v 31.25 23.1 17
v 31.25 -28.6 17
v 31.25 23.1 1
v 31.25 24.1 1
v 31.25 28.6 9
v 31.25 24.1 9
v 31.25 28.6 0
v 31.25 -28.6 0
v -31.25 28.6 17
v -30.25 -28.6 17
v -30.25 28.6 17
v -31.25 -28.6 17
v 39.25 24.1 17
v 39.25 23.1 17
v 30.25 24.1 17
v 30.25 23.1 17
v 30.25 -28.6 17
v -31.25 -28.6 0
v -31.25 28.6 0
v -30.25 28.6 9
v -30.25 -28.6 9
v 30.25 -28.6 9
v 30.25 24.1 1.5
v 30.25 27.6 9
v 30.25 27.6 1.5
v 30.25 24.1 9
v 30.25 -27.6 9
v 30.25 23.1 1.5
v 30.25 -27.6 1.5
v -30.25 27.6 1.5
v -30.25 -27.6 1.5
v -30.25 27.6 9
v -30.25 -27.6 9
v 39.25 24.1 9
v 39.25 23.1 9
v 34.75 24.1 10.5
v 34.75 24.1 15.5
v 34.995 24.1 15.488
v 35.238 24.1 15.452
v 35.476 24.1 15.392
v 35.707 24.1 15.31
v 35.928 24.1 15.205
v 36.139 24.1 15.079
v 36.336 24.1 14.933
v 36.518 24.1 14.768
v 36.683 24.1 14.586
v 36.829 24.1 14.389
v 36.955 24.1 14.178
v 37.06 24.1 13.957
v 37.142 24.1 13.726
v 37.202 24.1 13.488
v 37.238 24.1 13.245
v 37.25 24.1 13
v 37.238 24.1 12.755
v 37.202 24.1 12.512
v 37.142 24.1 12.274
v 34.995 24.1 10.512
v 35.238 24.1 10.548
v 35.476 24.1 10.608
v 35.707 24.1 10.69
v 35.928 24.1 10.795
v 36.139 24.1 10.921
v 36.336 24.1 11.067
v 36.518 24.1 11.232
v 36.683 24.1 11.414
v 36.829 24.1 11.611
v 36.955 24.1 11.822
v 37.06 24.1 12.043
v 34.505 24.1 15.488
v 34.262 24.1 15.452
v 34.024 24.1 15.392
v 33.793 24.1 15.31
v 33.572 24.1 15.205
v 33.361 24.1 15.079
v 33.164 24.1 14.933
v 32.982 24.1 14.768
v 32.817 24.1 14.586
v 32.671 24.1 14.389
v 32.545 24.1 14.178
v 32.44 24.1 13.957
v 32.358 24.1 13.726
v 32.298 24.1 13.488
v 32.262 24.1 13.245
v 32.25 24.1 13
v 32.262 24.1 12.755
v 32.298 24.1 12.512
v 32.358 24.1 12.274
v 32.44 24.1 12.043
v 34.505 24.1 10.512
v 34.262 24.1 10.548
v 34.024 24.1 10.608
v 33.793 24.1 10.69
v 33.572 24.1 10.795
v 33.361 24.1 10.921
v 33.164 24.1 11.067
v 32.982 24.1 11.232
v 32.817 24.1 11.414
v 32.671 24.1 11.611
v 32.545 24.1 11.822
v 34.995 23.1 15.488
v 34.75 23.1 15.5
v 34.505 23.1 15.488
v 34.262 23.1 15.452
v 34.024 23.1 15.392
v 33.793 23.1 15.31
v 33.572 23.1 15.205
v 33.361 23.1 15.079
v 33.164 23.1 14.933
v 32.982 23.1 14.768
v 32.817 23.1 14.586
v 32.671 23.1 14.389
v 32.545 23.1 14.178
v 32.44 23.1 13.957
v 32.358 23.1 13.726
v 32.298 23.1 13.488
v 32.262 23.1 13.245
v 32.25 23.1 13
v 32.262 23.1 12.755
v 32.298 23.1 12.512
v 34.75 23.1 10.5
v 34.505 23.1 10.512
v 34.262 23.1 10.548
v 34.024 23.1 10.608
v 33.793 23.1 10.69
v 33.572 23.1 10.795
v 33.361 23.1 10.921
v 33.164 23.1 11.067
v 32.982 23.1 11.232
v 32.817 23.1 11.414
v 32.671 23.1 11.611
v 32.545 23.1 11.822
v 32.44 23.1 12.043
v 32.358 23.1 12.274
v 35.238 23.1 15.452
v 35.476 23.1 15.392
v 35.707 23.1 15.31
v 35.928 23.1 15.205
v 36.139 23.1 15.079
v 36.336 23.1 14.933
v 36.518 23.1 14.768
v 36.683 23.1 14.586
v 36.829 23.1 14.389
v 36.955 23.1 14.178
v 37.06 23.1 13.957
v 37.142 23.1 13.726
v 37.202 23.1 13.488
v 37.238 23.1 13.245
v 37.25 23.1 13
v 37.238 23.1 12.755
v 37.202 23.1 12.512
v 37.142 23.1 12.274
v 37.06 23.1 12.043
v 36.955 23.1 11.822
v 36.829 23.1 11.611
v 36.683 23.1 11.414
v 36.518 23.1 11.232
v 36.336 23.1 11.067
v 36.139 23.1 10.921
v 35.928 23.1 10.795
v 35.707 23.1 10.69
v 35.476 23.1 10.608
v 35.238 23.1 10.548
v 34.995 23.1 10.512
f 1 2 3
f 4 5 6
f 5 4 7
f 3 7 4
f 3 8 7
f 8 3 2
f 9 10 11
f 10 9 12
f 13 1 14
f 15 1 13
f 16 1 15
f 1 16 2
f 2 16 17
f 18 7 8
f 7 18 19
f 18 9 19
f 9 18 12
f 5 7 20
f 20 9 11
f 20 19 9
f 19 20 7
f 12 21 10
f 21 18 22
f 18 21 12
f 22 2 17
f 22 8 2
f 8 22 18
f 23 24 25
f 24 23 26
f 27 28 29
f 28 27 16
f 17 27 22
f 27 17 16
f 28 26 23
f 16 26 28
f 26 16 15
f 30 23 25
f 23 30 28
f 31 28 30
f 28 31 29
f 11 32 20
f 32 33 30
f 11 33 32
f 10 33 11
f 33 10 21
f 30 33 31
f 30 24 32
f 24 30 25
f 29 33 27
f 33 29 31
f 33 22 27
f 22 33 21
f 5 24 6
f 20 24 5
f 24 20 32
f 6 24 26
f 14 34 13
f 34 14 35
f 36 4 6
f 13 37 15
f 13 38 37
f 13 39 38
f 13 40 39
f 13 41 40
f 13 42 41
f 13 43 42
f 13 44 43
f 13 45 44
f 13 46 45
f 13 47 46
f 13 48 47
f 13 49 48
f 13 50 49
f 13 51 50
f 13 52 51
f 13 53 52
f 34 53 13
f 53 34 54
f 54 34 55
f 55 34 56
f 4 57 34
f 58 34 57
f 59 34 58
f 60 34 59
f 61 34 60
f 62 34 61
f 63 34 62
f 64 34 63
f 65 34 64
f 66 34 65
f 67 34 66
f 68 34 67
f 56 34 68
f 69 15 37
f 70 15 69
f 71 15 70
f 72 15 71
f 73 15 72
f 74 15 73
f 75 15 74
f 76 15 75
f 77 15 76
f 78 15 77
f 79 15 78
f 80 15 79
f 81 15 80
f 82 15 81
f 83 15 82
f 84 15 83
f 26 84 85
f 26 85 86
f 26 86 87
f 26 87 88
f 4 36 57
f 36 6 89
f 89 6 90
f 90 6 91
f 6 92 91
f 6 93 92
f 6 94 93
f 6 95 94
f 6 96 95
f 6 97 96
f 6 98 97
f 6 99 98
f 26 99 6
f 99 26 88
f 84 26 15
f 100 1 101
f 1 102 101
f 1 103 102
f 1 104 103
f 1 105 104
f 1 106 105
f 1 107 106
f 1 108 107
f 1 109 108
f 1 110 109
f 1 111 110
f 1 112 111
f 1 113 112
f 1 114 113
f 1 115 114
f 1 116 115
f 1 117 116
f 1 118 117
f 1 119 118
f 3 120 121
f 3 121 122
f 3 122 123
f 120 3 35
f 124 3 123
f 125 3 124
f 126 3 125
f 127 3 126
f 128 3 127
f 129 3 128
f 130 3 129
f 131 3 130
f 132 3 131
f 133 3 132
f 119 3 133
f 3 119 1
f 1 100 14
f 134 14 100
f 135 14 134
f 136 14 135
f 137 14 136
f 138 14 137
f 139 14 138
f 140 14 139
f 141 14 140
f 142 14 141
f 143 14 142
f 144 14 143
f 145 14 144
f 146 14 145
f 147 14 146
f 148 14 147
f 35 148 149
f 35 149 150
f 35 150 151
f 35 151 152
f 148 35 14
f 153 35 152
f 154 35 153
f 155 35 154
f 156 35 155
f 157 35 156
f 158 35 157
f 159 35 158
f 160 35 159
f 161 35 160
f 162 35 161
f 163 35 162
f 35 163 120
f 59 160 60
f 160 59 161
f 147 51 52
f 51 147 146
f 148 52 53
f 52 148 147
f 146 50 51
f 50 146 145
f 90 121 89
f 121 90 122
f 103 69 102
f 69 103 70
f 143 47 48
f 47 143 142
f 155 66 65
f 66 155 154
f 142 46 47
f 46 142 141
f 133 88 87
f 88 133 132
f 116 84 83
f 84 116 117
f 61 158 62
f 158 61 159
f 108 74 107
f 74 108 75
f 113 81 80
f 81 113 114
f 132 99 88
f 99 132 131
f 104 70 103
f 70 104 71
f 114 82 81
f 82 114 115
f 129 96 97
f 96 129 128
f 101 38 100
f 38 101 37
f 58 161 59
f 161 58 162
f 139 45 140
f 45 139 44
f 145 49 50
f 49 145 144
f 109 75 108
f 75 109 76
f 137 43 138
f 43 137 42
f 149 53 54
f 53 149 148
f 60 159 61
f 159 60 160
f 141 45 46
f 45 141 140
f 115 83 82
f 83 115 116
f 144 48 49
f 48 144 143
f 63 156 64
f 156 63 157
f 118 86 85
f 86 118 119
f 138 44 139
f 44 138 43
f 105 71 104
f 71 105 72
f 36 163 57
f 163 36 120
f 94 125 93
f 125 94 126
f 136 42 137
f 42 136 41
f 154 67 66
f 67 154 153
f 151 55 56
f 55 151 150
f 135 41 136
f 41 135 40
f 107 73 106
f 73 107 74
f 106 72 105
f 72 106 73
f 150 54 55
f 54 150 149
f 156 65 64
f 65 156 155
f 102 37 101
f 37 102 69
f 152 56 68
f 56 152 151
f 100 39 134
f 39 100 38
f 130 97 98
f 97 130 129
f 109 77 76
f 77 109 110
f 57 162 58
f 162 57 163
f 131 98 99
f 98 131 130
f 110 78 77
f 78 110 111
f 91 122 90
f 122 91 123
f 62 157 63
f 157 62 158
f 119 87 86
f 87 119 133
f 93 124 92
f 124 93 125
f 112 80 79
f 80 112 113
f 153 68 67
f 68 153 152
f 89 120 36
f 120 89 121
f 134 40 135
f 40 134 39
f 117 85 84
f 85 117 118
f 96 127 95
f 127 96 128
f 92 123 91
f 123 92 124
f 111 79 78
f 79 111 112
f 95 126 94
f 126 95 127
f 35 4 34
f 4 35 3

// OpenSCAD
$fn=64;

thickness=1;
//ductLength=50;
//ductLength=9;
ctrlWidth=60.5;
fanHeight=55.2;
ctrlNotch=8;
bottomNotch=4.5;
sideNotch=9;
screwHoleD=5;


//right angled triangle
//l - length of prism
//w - width of triangle
//h - height of triangle
//From https://github.com/orionrobots/openscad_parts_library/blob/master/prism.scad
module prism(l, w, h) {
       polyhedron(points=[
               [0,0,h],           // 0    front top corner
               [0,0,0],[w,0,0],   // 1, 2 front left & right bottom corners
               [0,l,h],           // 3    back top corner
               [0,l,0],[w,l,0]    // 4, 5 back left & right bottom corners
       ], faces=[ // points for all faces must be ordered clockwise when looking in
               [0,2,1],    // top face
               [3,4,5],    // base face
               [0,1,4,3],  // h face
               [1,2,5,4],  // w face
               [0,3,5,2],  // hypotenuse face
       ]);
}

module screwFlap()
{
    //Upper inside corner is origo
    
    difference()
    {
        translate([sideNotch/2,-0.75*thickness,-ctrlNotch/2])cube([sideNotch,thickness,ctrlNotch],center=true);
        translate([sideNotch/2,-0.75*thickness,-ctrlNotch/2])rotate([90,0,0])cylinder(d=screwHoleD,h=2*thickness,center=true);
    }
    translate([0,-1.25*thickness,-ctrlNotch/2-sideNotch/2+thickness/2])mirror([0,0,1])prism(thickness,sideNotch,sideNotch);
    
}




module ACS180(ductLength=9)
{
    sideLength=ductLength+ctrlNotch;
    
    translate([0,0,sideLength/2])
    union()
    {
        difference()
        {
            cube([ctrlWidth+2*thickness,fanHeight+2*thickness,sideLength],center=true);
            
            translate([0,0,thickness])cube([ctrlWidth,fanHeight,sideLength-thickness],center=true);
            translate([0,0,ductLength/2])cube([ctrlWidth,fanHeight+2*thickness,ctrlNotch],center=true);
            translate([thickness,fanHeight/2-bottomNotch/2+thickness,ductLength/2])cube([ctrlWidth,bottomNotch,ctrlNotch],center=true);   
        }
    translate([ctrlWidth/2,fanHeight/2-bottomNotch/2-thickness,sideLength/2])screwFlap();
    }
}

module ACS180cutout(Length=20)
{
   translate([0,0,Length/2])cube([ctrlWidth+2*thickness,fanHeight+2*thickness,Length],center=true);
}

ACS180();
